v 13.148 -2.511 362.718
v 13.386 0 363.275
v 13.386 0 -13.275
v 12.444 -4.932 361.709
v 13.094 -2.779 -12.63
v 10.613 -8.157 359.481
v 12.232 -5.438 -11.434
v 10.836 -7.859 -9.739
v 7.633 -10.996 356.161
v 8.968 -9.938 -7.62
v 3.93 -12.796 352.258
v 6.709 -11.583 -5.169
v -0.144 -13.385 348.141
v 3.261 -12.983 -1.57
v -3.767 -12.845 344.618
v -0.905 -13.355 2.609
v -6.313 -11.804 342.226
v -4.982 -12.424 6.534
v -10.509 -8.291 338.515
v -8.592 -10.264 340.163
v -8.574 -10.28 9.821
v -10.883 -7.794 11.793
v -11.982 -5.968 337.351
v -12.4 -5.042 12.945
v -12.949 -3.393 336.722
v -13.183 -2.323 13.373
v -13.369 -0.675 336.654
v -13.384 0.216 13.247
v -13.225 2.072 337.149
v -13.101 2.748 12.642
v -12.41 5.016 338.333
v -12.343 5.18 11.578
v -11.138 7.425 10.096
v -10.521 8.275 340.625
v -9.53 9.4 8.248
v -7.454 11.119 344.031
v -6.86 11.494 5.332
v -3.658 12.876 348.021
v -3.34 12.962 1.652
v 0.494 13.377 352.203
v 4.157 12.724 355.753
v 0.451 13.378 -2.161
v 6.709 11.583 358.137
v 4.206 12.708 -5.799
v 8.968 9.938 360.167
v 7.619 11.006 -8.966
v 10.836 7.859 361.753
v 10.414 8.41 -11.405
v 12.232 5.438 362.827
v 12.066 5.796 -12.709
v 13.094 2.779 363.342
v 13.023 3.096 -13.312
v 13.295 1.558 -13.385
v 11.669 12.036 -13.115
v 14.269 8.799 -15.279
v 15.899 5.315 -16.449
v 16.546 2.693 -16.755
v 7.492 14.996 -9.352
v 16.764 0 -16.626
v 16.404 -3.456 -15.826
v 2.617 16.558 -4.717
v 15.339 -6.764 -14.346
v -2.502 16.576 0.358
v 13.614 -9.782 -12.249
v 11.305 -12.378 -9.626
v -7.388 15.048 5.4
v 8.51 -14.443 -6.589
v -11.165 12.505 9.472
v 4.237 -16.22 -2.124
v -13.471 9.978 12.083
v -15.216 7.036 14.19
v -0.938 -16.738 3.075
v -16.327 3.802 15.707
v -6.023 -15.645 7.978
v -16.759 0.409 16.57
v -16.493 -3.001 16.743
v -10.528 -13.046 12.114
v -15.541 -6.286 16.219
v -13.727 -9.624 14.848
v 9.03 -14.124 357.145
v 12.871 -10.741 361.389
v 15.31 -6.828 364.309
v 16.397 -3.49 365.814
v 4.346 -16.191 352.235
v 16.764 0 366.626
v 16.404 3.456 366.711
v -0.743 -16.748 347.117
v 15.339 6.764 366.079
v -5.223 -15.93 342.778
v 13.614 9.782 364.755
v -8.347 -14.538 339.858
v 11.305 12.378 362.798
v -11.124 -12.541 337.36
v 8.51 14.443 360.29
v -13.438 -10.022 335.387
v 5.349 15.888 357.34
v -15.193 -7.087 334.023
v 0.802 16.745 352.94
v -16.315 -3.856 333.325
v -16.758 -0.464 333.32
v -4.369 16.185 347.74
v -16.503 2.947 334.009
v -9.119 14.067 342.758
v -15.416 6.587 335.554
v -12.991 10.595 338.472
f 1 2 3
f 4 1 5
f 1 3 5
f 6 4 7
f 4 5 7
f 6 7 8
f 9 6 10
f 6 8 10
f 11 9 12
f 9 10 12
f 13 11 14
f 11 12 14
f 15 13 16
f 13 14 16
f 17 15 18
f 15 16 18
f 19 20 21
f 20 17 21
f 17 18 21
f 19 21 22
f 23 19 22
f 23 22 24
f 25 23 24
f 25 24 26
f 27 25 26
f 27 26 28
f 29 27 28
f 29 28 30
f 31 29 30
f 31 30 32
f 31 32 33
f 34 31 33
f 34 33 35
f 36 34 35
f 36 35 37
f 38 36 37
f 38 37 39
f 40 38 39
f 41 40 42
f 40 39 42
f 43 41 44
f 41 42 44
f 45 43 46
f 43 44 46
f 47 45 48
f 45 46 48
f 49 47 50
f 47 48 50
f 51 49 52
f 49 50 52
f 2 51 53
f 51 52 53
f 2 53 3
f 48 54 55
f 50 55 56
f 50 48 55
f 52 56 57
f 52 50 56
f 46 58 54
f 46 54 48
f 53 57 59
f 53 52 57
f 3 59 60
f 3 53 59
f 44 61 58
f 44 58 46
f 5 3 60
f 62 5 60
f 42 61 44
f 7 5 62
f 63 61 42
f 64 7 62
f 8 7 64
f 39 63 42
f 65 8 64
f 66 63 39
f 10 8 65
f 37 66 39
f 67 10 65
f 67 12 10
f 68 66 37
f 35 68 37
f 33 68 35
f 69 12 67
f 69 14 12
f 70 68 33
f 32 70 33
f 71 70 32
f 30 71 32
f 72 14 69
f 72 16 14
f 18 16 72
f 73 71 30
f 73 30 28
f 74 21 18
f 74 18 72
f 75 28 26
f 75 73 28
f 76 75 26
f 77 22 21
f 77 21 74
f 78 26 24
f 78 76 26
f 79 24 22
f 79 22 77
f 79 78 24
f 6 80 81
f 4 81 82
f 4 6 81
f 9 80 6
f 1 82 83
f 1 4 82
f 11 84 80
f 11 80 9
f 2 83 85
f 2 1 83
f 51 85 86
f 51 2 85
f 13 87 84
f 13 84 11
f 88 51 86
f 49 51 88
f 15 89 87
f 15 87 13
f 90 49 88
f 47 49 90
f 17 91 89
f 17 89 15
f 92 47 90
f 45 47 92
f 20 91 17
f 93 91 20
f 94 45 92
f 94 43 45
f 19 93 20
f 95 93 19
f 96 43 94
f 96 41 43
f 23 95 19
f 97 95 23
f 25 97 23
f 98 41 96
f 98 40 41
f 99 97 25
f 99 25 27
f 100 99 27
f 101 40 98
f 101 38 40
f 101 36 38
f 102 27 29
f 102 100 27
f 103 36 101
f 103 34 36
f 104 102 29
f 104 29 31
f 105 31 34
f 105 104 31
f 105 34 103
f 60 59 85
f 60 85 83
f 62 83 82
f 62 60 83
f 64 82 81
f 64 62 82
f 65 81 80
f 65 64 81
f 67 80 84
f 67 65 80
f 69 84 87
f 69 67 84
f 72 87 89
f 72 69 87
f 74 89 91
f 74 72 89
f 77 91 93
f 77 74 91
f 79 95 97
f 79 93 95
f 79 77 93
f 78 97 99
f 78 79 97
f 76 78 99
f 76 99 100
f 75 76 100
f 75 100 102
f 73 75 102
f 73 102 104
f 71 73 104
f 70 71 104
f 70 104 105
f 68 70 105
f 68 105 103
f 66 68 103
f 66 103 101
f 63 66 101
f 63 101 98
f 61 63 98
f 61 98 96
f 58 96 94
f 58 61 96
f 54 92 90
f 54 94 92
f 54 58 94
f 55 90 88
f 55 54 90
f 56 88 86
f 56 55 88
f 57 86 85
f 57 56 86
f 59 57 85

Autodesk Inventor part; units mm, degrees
ref_plane "Start plane" through (0, 0, -18.7744) normal (0, 0, 1) x (1, 0, 0)
ref_plane "End plane" through (0, 0, 368.7744) normal (0, 0, 1) x (1, 0, 0)
sketch "Sketch" plane through (0, 0, 0) normal (0, 0, 1) x (1, 0, 0)
  circle A0 centre (0, 0) radius 13.3858
  circle A1 centre (0, 0) radius 16.764
  dimension "d0" = 33.528
  dimension "d1" = 3.3782
extrude "Body" add sketch "Sketch" along normal up to surface (387.5489 mm away) from surface at -18.7744
sketch "Sketch3" plane through (0, 0, 0) normal (0, 0, 1) x (1, 0, 0)
  line L0 (0, 0) -> (10, 0)
ref_plane "Work Plane3" through (0, 0, 0) normal (0, -1, 0) x (1, 0, 0)
ref_plane "Work Plane4" through (16.6257, 2.1487, 366.764) normal (-0.7013, -0.0906, 0.7071) x (0.7119, -0.0372, 0.7013)
split "Split1" plane through (16.6257, 2.1487, 366.764) removes the side toward (-0.7013, -0.0906, 0.7071)
ref_plane "Work Plane5" through (16.6257, 2.1487, -16.764) normal (-0.7013, -0.0906, -0.7071) x (-0.6791, -0.217, 0.7013)
split "Split2" plane through (16.6257, 2.1487, -16.764) removes the side toward (-0.7013, -0.0906, -0.7071)
sketch "Sketch4" plane through (0, 0, 0) normal (0, -1, 0) x (1, 0, 0)
  line L0 (-2, -18.7744) -> (12, -18.7744) projected
  line L1 (-2, 368.7744) -> (12, 368.7744) projected
  dimension "d7" = 387.5489
equation "\"d0\" = G_H"
equation "\"d1\" = G_T"
equation "\"d2\" = G_L"
equation "\"G_H\" = 33.528"
equation "\"G_T\" = 3.3782"
equation "\"G_L\" = 383.528"
equation "\"G_OFFSET_START\" = 18.77444"
equation "\"G_OFFSET_END\" = 18.77444"
equation "\"d4\" = -G_OFFSET_START"
equation "\"d5\" = G_OFFSET_END + B_L"
equation "\"B_L\" = 350"
properties part number "ANSI - 1 x 0.133 - 15.1" material "Steel, Mild"
